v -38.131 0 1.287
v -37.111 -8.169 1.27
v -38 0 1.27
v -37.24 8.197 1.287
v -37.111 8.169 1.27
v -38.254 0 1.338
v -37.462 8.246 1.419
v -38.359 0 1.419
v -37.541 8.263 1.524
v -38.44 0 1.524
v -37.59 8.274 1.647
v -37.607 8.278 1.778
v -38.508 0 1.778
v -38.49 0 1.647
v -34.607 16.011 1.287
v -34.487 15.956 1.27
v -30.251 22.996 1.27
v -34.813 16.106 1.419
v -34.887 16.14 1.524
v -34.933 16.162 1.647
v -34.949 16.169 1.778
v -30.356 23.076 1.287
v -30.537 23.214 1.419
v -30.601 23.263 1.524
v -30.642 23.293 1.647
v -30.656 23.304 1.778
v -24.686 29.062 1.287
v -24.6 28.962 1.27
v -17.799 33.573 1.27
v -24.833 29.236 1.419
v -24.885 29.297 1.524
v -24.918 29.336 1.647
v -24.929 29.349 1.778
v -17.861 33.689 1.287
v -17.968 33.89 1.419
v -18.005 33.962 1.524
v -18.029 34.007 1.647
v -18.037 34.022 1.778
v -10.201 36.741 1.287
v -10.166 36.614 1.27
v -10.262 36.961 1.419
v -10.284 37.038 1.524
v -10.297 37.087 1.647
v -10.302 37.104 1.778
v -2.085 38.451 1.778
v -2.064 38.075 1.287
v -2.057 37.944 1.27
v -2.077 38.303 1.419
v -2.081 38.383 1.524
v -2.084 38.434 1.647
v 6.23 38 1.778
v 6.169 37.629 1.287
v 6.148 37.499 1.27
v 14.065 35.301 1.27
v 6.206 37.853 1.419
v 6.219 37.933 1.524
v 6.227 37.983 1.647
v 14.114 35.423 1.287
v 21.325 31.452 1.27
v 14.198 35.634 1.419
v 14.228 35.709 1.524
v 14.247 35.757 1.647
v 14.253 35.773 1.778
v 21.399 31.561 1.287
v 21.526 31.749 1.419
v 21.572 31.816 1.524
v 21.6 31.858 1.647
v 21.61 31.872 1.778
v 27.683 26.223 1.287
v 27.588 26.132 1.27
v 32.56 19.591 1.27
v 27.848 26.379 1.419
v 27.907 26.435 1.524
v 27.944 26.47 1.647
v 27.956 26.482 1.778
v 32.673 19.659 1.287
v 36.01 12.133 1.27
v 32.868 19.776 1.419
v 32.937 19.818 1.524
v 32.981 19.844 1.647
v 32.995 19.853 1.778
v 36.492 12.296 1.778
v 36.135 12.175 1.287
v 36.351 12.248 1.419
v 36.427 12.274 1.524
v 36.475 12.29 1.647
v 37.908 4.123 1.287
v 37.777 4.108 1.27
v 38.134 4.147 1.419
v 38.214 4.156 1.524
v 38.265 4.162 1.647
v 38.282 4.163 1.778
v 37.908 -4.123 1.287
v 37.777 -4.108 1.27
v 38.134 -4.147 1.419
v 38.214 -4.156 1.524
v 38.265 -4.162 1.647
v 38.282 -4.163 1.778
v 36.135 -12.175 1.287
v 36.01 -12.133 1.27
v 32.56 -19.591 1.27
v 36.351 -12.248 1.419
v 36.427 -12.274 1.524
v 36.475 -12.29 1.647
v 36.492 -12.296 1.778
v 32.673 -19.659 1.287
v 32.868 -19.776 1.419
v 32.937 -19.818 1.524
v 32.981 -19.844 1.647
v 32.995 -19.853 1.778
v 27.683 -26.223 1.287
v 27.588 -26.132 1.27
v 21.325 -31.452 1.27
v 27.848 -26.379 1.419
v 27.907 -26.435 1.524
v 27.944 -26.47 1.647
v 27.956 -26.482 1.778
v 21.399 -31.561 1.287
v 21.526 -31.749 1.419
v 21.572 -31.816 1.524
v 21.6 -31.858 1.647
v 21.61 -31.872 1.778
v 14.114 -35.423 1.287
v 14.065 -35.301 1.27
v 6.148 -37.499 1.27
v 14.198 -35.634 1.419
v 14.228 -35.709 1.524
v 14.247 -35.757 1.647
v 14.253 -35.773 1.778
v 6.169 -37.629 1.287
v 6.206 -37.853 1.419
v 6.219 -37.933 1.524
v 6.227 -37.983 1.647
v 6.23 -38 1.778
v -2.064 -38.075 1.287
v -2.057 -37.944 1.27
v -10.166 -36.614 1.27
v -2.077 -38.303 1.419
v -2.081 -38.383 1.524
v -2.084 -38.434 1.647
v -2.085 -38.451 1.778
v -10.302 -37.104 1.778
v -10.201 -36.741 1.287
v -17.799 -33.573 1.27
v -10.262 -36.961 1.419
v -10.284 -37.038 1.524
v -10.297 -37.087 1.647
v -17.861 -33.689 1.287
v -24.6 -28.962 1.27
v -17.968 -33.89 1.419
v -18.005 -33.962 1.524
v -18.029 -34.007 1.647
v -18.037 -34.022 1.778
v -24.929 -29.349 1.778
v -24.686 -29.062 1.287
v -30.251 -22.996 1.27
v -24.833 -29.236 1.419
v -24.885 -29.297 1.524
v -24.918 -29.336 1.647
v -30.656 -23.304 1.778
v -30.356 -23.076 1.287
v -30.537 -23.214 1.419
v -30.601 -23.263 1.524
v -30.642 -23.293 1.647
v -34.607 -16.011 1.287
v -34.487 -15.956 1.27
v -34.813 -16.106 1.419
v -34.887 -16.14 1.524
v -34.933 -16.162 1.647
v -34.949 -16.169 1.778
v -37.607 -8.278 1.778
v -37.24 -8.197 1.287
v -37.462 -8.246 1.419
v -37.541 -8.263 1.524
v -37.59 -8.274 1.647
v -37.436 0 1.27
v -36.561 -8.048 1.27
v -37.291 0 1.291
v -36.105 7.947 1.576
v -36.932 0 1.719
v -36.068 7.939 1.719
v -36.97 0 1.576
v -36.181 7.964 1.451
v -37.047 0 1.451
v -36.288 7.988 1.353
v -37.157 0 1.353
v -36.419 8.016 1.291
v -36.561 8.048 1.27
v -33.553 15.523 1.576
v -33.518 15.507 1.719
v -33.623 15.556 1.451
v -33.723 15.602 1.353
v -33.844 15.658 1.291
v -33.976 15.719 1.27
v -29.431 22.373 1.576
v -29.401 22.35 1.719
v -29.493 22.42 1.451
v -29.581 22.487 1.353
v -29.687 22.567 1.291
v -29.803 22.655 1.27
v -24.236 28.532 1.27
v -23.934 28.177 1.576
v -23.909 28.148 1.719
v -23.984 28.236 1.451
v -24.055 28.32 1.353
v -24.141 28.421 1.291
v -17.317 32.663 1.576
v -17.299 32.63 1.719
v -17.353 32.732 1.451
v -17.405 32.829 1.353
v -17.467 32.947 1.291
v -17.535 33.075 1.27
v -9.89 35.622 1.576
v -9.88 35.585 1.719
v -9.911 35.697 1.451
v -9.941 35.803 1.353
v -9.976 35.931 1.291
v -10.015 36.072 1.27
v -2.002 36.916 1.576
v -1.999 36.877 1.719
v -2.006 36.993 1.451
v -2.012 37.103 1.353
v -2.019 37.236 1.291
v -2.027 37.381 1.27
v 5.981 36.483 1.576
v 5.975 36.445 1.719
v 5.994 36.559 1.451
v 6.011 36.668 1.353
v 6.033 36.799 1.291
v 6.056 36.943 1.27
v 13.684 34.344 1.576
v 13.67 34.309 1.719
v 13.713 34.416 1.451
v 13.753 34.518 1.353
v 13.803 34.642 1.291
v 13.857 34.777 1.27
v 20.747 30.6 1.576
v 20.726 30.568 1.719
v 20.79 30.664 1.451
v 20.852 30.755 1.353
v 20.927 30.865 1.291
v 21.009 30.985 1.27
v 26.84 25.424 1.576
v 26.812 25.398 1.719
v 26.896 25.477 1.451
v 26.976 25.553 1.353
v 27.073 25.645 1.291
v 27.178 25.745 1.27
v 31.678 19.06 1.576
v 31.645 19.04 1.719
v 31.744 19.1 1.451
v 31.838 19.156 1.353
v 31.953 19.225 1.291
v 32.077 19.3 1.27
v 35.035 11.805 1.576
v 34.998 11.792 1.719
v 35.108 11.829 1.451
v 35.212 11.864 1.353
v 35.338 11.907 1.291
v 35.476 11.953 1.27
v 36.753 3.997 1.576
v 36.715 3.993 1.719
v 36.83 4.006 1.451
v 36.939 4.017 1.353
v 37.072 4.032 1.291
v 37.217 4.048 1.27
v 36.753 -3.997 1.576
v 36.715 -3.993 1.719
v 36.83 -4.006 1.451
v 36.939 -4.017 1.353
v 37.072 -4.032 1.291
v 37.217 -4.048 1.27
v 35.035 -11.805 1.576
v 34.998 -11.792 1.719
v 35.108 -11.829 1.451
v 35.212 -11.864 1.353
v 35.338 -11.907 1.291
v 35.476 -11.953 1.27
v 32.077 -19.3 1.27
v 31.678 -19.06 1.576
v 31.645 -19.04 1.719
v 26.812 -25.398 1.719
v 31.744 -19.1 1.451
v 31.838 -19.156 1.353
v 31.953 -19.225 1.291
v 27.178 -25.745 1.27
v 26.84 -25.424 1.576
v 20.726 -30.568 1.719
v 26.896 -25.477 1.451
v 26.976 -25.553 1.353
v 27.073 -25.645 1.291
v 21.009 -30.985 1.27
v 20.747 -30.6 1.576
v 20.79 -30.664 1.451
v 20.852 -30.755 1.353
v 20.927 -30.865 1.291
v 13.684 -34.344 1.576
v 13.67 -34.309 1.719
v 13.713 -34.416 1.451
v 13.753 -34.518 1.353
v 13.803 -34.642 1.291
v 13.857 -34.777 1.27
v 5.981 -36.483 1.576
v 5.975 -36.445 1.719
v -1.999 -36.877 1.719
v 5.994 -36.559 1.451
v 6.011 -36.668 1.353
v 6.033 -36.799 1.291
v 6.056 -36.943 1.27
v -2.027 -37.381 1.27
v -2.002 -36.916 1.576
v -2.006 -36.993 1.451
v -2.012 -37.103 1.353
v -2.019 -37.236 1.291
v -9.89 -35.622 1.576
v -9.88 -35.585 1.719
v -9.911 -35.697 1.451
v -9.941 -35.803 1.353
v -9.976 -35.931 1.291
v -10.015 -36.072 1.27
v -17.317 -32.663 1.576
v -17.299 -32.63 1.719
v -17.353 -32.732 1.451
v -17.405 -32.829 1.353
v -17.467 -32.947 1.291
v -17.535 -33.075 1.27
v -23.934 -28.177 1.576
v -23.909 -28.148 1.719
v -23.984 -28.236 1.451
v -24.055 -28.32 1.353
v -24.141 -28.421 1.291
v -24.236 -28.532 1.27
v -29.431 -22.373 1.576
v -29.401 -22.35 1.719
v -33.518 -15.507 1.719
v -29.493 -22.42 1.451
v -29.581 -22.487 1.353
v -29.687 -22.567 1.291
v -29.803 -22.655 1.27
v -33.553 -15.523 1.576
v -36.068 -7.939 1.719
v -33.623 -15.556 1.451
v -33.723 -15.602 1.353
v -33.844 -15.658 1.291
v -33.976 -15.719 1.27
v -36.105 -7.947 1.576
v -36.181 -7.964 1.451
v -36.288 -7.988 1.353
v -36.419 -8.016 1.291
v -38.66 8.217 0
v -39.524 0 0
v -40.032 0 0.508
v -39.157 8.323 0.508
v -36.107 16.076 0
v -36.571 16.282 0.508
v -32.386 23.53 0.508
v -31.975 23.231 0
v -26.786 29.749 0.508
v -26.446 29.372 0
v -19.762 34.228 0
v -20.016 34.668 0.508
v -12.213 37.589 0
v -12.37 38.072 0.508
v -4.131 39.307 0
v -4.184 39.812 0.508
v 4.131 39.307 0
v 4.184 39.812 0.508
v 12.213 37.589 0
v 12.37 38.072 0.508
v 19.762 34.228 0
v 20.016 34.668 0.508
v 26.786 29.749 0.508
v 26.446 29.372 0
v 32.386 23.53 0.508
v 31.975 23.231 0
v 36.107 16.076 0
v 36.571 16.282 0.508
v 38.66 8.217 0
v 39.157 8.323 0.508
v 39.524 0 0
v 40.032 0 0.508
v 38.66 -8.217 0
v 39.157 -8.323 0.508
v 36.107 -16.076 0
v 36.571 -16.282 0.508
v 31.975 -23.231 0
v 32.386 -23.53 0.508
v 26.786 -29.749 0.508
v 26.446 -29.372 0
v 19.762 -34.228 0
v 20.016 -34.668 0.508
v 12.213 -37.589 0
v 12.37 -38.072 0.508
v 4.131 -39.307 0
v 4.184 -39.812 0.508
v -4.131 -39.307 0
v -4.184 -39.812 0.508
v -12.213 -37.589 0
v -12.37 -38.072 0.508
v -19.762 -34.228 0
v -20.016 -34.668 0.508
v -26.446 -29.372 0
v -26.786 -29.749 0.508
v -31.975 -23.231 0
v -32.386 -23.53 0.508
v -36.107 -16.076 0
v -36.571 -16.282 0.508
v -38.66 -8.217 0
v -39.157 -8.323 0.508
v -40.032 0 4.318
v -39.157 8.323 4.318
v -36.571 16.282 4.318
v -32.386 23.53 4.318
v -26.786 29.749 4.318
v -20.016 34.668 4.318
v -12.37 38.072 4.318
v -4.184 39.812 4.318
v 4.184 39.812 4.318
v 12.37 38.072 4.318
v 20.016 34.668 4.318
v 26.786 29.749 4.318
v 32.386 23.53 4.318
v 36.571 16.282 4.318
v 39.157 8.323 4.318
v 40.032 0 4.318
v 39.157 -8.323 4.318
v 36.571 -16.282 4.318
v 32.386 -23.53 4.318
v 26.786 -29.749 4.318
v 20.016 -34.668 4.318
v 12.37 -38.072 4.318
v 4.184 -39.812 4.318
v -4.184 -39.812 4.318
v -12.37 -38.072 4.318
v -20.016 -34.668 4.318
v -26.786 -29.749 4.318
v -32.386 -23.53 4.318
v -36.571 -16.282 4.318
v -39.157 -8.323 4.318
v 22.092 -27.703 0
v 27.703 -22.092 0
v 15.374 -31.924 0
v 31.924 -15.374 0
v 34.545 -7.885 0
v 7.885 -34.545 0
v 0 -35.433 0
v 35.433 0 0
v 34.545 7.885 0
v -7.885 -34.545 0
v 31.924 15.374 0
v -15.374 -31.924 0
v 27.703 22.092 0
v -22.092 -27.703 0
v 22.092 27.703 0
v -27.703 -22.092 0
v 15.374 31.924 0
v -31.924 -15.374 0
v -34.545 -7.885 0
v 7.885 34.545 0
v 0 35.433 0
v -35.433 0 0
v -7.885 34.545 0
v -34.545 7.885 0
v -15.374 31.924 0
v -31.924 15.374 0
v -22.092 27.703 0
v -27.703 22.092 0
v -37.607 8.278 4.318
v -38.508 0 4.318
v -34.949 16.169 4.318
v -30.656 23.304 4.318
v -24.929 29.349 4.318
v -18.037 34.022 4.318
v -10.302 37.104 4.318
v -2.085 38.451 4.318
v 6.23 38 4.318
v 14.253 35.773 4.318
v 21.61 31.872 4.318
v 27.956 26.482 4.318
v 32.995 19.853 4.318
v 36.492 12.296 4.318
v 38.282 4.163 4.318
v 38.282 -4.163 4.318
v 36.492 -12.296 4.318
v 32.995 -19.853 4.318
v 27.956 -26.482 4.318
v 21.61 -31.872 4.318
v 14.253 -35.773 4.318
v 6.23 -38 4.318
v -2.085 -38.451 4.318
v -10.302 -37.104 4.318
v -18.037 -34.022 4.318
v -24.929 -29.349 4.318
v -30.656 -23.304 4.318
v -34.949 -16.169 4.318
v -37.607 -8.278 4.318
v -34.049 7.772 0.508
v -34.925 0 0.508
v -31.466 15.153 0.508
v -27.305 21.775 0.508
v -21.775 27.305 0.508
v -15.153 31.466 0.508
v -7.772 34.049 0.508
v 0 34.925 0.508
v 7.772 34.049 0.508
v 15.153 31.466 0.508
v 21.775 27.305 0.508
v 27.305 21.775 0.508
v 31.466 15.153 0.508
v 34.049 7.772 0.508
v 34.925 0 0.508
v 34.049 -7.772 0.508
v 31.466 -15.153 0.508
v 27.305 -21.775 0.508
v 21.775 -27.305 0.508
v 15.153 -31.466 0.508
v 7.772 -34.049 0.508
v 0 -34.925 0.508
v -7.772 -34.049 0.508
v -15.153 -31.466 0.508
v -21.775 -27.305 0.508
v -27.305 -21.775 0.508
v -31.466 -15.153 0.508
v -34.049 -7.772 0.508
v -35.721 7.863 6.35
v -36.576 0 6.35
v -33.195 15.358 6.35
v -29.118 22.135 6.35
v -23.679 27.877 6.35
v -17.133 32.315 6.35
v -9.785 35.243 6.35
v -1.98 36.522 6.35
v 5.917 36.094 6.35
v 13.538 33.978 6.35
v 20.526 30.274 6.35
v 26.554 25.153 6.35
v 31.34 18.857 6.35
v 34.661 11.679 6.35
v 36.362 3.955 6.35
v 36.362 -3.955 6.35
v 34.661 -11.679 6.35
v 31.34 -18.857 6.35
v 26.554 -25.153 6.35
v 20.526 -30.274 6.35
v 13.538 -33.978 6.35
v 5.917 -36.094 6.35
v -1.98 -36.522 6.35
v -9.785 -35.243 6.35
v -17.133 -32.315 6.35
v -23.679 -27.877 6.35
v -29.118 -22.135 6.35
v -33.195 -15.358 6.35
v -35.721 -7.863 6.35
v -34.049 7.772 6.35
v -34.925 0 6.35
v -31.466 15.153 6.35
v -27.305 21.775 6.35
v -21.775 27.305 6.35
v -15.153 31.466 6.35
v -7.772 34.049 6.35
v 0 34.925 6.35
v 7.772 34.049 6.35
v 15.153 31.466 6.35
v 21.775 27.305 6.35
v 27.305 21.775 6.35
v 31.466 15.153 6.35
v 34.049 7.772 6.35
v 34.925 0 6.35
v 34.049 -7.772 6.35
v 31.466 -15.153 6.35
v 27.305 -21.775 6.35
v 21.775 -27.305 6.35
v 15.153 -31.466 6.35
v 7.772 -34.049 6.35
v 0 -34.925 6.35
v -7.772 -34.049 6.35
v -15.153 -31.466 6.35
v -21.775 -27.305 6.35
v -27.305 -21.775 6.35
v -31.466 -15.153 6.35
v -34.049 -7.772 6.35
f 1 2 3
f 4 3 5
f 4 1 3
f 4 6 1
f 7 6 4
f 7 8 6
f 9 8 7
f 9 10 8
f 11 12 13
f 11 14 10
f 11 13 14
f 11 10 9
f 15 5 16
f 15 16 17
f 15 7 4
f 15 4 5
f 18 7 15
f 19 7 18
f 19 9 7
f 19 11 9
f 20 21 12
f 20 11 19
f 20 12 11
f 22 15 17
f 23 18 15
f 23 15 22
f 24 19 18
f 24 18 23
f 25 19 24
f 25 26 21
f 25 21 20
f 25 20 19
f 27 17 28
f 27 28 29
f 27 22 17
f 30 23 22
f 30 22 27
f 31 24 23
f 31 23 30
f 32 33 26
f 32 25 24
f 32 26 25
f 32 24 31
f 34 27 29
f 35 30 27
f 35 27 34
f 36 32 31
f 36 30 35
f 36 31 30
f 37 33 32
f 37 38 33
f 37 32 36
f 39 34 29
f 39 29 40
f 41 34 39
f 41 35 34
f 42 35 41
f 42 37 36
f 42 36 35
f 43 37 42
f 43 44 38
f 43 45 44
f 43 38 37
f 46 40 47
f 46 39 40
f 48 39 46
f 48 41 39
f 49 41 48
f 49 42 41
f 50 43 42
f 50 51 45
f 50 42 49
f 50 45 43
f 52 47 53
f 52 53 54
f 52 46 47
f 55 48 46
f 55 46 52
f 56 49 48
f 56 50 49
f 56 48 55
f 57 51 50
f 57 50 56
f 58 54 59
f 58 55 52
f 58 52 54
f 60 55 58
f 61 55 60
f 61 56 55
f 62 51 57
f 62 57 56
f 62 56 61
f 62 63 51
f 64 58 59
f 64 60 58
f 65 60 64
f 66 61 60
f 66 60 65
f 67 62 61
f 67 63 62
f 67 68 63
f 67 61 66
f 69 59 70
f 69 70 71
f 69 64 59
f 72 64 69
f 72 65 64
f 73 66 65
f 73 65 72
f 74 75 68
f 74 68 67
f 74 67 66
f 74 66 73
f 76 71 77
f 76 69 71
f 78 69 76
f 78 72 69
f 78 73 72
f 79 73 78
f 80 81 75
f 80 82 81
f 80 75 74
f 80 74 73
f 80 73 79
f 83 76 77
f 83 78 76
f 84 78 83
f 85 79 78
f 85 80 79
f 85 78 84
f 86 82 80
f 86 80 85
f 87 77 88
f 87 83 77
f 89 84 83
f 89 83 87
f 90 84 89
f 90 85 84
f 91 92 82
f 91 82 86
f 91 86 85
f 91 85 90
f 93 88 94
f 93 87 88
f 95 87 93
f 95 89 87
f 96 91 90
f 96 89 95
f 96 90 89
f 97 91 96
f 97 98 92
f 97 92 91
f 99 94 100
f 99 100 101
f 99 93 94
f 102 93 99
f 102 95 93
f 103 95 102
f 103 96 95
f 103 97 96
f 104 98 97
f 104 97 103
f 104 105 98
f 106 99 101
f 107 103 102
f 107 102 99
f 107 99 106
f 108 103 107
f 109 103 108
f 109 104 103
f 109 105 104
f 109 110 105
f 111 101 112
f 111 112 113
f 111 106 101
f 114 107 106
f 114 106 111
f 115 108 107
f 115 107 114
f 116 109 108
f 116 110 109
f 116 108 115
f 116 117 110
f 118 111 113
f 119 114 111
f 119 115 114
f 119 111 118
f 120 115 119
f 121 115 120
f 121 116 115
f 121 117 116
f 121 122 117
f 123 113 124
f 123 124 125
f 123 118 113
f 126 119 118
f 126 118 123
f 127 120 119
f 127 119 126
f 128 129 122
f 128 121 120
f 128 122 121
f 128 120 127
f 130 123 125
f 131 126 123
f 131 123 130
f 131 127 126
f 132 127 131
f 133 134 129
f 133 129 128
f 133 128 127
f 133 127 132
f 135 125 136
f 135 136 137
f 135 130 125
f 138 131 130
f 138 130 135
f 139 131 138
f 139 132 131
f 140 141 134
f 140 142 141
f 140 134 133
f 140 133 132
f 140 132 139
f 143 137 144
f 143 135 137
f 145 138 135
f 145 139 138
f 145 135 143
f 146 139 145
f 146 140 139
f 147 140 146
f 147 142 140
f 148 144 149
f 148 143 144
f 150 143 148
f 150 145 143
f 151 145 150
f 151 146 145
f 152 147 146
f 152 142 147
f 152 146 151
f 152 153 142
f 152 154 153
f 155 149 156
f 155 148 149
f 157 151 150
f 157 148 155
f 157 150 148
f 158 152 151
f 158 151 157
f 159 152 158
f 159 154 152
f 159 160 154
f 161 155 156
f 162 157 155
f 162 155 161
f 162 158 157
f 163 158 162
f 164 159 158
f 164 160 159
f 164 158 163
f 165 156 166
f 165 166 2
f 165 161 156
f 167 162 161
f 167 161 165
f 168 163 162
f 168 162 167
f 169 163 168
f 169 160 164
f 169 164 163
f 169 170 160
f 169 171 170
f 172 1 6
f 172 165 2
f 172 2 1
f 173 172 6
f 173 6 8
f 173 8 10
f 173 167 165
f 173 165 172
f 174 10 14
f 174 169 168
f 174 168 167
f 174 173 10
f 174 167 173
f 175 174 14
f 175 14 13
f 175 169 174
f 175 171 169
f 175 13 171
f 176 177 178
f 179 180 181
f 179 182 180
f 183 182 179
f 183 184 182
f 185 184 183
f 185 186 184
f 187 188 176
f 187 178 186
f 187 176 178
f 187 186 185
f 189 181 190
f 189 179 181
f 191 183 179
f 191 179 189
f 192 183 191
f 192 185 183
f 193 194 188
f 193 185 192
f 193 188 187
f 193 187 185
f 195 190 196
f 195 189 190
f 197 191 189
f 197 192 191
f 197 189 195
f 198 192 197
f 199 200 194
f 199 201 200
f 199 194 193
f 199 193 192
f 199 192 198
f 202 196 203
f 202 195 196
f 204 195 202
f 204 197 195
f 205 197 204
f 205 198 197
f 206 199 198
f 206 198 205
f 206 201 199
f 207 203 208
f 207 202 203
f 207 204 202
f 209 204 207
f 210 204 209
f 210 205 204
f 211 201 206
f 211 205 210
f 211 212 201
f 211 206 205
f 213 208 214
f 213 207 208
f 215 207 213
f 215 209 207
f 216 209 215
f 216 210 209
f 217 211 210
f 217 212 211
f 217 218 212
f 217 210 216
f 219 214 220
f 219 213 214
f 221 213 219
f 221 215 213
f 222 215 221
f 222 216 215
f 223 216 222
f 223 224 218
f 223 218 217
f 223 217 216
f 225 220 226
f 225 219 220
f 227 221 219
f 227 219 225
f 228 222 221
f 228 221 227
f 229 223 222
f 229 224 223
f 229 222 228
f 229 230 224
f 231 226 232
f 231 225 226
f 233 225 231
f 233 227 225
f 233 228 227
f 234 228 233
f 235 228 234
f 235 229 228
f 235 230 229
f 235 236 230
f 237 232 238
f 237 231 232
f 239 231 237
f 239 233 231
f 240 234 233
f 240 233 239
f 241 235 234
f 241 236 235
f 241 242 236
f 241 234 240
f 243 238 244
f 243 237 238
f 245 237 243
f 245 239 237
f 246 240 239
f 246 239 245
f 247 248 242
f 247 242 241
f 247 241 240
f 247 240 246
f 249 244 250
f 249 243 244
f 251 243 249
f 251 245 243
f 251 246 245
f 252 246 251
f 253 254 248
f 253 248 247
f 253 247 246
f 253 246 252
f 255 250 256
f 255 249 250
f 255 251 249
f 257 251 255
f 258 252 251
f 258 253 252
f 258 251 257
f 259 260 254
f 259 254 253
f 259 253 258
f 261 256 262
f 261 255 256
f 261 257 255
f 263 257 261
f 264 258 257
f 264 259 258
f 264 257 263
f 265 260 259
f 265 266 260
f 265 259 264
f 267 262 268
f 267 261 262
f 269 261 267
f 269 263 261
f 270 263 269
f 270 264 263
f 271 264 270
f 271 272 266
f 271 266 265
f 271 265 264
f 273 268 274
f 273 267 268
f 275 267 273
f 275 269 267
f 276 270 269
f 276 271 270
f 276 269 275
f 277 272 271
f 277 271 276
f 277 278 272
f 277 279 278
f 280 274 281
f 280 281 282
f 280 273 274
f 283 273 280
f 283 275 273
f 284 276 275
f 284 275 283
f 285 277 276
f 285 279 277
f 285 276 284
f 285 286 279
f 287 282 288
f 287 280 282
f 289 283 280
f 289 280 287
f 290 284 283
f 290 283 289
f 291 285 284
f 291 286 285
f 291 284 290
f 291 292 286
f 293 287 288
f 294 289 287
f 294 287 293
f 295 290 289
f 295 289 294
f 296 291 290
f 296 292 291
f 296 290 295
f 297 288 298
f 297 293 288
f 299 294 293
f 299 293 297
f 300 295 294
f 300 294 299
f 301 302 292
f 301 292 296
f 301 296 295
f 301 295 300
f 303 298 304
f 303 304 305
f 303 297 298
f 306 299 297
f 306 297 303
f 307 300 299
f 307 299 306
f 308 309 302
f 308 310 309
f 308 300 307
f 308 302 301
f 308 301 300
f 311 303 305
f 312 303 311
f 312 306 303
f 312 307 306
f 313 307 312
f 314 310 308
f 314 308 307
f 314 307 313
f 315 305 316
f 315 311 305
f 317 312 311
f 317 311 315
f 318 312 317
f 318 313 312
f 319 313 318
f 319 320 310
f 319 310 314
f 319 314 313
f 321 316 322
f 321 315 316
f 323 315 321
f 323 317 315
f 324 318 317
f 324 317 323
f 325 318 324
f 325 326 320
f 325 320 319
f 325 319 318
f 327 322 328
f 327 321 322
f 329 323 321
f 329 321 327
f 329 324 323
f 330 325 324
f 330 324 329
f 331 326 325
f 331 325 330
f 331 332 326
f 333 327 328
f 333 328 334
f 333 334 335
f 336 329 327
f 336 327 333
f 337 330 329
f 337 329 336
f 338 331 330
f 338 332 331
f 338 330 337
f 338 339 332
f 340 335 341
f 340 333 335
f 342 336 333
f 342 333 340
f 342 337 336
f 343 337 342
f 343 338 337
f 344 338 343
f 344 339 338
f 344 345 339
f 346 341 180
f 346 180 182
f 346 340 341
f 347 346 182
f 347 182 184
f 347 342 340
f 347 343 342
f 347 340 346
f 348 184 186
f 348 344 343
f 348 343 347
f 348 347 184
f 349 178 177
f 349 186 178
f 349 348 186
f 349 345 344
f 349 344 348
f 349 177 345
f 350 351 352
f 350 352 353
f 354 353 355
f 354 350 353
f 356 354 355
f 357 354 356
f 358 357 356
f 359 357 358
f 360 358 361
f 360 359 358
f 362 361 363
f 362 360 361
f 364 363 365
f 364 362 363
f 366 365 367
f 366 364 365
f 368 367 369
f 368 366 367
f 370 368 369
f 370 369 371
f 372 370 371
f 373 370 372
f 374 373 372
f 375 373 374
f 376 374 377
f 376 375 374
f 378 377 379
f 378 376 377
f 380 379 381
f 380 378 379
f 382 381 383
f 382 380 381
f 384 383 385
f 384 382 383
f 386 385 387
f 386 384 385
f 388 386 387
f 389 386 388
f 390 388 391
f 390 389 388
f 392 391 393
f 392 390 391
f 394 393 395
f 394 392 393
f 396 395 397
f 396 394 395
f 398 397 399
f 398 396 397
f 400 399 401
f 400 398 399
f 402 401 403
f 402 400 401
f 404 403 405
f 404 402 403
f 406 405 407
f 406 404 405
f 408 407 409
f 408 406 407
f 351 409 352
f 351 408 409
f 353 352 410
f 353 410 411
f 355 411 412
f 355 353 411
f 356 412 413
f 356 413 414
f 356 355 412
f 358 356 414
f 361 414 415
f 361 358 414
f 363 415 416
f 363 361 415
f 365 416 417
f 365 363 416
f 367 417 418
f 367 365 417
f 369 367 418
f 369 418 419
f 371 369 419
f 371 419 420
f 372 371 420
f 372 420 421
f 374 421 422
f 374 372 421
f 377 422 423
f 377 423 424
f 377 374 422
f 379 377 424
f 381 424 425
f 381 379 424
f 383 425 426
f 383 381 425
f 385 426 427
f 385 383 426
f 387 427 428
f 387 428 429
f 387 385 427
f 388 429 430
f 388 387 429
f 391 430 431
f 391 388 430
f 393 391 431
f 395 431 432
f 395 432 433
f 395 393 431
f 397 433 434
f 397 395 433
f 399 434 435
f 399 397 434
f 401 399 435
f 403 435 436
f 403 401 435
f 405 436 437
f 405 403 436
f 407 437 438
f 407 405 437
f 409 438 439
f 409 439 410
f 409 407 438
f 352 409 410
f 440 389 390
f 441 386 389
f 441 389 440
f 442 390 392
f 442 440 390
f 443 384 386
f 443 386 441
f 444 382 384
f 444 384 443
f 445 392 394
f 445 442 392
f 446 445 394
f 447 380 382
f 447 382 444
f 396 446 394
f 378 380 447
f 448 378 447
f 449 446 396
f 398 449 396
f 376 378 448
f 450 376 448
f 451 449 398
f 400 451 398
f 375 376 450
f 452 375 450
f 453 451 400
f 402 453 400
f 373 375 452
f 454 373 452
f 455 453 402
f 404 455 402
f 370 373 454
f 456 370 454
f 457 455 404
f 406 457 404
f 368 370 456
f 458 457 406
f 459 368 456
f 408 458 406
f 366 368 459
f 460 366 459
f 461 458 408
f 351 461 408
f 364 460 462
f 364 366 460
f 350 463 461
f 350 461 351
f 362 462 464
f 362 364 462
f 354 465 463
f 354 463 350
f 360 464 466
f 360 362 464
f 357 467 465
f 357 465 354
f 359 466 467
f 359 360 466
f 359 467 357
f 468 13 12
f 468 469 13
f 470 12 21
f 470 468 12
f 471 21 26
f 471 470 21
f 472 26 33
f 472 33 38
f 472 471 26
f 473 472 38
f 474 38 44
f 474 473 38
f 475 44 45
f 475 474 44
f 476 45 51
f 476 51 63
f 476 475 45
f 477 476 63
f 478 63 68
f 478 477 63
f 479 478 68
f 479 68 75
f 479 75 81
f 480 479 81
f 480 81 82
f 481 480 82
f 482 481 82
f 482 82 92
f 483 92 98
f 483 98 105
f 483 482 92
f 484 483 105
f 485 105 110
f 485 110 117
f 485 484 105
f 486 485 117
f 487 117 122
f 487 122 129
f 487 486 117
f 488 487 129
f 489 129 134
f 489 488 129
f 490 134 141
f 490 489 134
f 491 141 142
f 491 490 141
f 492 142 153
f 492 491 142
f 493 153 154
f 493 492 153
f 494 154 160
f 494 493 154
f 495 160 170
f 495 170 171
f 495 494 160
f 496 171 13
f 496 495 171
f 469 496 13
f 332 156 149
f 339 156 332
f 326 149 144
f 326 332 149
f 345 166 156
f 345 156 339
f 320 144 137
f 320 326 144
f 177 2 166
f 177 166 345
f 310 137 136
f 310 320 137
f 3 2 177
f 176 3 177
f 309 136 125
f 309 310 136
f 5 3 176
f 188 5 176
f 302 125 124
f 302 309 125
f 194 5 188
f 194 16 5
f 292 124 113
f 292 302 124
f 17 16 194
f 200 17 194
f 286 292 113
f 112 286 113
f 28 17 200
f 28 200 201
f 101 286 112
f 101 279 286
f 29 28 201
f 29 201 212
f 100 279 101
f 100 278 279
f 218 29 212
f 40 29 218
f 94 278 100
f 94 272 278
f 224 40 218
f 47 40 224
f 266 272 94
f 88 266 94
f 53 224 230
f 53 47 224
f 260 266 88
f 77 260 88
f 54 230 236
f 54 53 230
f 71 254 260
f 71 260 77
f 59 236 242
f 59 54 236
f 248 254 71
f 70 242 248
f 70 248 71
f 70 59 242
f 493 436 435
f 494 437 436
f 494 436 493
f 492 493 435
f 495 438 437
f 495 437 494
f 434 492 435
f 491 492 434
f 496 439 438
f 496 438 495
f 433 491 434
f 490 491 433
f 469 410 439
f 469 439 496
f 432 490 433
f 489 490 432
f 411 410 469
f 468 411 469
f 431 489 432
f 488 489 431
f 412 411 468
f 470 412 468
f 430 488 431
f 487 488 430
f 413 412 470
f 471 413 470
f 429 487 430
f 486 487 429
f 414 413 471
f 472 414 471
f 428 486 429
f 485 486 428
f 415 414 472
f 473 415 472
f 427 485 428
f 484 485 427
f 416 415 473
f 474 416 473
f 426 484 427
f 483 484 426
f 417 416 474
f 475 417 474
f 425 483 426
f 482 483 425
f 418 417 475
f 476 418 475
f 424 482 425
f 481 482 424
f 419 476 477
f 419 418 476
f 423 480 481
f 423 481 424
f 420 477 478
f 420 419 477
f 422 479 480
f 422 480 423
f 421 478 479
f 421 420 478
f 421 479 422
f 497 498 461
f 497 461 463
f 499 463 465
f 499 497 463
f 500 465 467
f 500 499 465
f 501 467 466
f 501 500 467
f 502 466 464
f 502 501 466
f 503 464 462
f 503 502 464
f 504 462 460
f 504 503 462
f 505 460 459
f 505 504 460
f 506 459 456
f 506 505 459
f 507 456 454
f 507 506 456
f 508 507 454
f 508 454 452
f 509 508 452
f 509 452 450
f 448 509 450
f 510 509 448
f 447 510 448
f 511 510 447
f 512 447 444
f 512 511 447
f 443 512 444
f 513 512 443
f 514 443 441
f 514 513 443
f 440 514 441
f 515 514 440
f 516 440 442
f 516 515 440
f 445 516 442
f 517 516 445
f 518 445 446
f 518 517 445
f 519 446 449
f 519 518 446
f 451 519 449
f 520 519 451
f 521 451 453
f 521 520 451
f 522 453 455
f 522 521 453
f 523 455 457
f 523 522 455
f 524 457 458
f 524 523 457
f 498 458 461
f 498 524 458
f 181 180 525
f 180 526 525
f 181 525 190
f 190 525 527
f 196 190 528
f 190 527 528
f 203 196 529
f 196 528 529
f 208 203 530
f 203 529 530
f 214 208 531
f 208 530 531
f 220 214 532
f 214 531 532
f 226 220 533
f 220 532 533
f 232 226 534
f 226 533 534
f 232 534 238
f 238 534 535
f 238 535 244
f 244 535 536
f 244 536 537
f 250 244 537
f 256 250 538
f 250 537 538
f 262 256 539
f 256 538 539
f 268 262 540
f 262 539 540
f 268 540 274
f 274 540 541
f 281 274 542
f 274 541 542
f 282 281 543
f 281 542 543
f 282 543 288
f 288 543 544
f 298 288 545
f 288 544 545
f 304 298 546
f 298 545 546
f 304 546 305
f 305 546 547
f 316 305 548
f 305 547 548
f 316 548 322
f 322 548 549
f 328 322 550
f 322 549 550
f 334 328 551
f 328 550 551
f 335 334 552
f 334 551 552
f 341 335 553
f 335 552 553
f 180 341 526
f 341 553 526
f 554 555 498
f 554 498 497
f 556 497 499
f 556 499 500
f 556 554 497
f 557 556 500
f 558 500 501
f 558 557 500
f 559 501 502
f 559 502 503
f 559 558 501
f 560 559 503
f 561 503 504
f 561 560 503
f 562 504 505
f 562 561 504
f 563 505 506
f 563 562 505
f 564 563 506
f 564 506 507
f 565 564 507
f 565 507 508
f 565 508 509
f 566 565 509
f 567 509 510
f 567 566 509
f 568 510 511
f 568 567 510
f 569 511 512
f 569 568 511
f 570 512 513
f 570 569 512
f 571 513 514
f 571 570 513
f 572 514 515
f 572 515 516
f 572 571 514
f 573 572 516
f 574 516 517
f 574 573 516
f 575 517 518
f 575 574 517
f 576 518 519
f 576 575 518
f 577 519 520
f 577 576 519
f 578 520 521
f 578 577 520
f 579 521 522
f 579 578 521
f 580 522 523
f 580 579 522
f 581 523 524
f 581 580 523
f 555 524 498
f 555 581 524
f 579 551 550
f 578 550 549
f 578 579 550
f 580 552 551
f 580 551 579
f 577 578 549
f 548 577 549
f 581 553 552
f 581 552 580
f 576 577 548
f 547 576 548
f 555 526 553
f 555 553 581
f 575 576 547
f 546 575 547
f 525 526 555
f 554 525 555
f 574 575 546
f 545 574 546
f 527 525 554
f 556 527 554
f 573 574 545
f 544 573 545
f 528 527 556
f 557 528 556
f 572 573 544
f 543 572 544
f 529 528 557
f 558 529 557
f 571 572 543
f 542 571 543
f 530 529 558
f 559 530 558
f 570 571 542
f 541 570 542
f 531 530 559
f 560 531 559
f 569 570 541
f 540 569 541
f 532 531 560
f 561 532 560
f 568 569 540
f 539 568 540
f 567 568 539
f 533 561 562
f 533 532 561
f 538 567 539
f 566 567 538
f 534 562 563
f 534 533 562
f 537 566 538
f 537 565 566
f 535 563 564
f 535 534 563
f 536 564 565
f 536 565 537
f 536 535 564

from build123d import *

# Parameters (mm, degrees)
F2_SIZE = 0.508


with BuildPart() as f1:
    # F0 (on Front) → F1 (revolve)
    with BuildSketch(Plane.XZ):
        with BuildLine():
            Line((-38.5075793592, 4.318), (-40.0315793592, 4.318))
            Line((-40.0315793592, 4.318), (-40.0315793592, 0))
            Line((-40.0315793592, 0), (-34.925, 0))
            Line((-34.925, 0), (-34.925, 6.35))
            Line((-34.925, 6.35), (-36.576, 6.35))
            add(Edge.make_bspline(
                [(-36.9315961026, 1.7185381239), (-36.8399383355, 2.4962141158), (-36.6397686392, 4.1078624216), (-36.5864010249, 5.9432817172), (-36.576, 6.35)],
                knots=[0.0857349599, 0.0857349599, 0.0857349599, 0.0857349599, 0.5311692207, 1, 1, 1, 1], degree=3))
            ThreePointArc((-36.9315961026, 1.7185381239), (-37.098570833, 1.3983484275), (-37.4361040662, 1.27))
            Line((-37.4361040662, 1.27), (-37.9995793592, 1.27))
            ThreePointArc((-37.9995793592, 1.27), (-38.3587896041, 1.4187897552), (-38.5075793592, 1.778))
            Line((-38.5075793592, 1.778), (-38.5075793592, 4.318))
        make_face()
    revolve(axis=Axis((0, 0, 11.9043216109), (0, 0, -1)))

    # F2
    f2_edges = [f1.edges().sort_by_distance(p)[0] for p in [
        (40.031579, 0, 0),
        (34.925, 0, 0),
    ]]
    chamfer(f2_edges, length=F2_SIZE)


solid = f1.part
